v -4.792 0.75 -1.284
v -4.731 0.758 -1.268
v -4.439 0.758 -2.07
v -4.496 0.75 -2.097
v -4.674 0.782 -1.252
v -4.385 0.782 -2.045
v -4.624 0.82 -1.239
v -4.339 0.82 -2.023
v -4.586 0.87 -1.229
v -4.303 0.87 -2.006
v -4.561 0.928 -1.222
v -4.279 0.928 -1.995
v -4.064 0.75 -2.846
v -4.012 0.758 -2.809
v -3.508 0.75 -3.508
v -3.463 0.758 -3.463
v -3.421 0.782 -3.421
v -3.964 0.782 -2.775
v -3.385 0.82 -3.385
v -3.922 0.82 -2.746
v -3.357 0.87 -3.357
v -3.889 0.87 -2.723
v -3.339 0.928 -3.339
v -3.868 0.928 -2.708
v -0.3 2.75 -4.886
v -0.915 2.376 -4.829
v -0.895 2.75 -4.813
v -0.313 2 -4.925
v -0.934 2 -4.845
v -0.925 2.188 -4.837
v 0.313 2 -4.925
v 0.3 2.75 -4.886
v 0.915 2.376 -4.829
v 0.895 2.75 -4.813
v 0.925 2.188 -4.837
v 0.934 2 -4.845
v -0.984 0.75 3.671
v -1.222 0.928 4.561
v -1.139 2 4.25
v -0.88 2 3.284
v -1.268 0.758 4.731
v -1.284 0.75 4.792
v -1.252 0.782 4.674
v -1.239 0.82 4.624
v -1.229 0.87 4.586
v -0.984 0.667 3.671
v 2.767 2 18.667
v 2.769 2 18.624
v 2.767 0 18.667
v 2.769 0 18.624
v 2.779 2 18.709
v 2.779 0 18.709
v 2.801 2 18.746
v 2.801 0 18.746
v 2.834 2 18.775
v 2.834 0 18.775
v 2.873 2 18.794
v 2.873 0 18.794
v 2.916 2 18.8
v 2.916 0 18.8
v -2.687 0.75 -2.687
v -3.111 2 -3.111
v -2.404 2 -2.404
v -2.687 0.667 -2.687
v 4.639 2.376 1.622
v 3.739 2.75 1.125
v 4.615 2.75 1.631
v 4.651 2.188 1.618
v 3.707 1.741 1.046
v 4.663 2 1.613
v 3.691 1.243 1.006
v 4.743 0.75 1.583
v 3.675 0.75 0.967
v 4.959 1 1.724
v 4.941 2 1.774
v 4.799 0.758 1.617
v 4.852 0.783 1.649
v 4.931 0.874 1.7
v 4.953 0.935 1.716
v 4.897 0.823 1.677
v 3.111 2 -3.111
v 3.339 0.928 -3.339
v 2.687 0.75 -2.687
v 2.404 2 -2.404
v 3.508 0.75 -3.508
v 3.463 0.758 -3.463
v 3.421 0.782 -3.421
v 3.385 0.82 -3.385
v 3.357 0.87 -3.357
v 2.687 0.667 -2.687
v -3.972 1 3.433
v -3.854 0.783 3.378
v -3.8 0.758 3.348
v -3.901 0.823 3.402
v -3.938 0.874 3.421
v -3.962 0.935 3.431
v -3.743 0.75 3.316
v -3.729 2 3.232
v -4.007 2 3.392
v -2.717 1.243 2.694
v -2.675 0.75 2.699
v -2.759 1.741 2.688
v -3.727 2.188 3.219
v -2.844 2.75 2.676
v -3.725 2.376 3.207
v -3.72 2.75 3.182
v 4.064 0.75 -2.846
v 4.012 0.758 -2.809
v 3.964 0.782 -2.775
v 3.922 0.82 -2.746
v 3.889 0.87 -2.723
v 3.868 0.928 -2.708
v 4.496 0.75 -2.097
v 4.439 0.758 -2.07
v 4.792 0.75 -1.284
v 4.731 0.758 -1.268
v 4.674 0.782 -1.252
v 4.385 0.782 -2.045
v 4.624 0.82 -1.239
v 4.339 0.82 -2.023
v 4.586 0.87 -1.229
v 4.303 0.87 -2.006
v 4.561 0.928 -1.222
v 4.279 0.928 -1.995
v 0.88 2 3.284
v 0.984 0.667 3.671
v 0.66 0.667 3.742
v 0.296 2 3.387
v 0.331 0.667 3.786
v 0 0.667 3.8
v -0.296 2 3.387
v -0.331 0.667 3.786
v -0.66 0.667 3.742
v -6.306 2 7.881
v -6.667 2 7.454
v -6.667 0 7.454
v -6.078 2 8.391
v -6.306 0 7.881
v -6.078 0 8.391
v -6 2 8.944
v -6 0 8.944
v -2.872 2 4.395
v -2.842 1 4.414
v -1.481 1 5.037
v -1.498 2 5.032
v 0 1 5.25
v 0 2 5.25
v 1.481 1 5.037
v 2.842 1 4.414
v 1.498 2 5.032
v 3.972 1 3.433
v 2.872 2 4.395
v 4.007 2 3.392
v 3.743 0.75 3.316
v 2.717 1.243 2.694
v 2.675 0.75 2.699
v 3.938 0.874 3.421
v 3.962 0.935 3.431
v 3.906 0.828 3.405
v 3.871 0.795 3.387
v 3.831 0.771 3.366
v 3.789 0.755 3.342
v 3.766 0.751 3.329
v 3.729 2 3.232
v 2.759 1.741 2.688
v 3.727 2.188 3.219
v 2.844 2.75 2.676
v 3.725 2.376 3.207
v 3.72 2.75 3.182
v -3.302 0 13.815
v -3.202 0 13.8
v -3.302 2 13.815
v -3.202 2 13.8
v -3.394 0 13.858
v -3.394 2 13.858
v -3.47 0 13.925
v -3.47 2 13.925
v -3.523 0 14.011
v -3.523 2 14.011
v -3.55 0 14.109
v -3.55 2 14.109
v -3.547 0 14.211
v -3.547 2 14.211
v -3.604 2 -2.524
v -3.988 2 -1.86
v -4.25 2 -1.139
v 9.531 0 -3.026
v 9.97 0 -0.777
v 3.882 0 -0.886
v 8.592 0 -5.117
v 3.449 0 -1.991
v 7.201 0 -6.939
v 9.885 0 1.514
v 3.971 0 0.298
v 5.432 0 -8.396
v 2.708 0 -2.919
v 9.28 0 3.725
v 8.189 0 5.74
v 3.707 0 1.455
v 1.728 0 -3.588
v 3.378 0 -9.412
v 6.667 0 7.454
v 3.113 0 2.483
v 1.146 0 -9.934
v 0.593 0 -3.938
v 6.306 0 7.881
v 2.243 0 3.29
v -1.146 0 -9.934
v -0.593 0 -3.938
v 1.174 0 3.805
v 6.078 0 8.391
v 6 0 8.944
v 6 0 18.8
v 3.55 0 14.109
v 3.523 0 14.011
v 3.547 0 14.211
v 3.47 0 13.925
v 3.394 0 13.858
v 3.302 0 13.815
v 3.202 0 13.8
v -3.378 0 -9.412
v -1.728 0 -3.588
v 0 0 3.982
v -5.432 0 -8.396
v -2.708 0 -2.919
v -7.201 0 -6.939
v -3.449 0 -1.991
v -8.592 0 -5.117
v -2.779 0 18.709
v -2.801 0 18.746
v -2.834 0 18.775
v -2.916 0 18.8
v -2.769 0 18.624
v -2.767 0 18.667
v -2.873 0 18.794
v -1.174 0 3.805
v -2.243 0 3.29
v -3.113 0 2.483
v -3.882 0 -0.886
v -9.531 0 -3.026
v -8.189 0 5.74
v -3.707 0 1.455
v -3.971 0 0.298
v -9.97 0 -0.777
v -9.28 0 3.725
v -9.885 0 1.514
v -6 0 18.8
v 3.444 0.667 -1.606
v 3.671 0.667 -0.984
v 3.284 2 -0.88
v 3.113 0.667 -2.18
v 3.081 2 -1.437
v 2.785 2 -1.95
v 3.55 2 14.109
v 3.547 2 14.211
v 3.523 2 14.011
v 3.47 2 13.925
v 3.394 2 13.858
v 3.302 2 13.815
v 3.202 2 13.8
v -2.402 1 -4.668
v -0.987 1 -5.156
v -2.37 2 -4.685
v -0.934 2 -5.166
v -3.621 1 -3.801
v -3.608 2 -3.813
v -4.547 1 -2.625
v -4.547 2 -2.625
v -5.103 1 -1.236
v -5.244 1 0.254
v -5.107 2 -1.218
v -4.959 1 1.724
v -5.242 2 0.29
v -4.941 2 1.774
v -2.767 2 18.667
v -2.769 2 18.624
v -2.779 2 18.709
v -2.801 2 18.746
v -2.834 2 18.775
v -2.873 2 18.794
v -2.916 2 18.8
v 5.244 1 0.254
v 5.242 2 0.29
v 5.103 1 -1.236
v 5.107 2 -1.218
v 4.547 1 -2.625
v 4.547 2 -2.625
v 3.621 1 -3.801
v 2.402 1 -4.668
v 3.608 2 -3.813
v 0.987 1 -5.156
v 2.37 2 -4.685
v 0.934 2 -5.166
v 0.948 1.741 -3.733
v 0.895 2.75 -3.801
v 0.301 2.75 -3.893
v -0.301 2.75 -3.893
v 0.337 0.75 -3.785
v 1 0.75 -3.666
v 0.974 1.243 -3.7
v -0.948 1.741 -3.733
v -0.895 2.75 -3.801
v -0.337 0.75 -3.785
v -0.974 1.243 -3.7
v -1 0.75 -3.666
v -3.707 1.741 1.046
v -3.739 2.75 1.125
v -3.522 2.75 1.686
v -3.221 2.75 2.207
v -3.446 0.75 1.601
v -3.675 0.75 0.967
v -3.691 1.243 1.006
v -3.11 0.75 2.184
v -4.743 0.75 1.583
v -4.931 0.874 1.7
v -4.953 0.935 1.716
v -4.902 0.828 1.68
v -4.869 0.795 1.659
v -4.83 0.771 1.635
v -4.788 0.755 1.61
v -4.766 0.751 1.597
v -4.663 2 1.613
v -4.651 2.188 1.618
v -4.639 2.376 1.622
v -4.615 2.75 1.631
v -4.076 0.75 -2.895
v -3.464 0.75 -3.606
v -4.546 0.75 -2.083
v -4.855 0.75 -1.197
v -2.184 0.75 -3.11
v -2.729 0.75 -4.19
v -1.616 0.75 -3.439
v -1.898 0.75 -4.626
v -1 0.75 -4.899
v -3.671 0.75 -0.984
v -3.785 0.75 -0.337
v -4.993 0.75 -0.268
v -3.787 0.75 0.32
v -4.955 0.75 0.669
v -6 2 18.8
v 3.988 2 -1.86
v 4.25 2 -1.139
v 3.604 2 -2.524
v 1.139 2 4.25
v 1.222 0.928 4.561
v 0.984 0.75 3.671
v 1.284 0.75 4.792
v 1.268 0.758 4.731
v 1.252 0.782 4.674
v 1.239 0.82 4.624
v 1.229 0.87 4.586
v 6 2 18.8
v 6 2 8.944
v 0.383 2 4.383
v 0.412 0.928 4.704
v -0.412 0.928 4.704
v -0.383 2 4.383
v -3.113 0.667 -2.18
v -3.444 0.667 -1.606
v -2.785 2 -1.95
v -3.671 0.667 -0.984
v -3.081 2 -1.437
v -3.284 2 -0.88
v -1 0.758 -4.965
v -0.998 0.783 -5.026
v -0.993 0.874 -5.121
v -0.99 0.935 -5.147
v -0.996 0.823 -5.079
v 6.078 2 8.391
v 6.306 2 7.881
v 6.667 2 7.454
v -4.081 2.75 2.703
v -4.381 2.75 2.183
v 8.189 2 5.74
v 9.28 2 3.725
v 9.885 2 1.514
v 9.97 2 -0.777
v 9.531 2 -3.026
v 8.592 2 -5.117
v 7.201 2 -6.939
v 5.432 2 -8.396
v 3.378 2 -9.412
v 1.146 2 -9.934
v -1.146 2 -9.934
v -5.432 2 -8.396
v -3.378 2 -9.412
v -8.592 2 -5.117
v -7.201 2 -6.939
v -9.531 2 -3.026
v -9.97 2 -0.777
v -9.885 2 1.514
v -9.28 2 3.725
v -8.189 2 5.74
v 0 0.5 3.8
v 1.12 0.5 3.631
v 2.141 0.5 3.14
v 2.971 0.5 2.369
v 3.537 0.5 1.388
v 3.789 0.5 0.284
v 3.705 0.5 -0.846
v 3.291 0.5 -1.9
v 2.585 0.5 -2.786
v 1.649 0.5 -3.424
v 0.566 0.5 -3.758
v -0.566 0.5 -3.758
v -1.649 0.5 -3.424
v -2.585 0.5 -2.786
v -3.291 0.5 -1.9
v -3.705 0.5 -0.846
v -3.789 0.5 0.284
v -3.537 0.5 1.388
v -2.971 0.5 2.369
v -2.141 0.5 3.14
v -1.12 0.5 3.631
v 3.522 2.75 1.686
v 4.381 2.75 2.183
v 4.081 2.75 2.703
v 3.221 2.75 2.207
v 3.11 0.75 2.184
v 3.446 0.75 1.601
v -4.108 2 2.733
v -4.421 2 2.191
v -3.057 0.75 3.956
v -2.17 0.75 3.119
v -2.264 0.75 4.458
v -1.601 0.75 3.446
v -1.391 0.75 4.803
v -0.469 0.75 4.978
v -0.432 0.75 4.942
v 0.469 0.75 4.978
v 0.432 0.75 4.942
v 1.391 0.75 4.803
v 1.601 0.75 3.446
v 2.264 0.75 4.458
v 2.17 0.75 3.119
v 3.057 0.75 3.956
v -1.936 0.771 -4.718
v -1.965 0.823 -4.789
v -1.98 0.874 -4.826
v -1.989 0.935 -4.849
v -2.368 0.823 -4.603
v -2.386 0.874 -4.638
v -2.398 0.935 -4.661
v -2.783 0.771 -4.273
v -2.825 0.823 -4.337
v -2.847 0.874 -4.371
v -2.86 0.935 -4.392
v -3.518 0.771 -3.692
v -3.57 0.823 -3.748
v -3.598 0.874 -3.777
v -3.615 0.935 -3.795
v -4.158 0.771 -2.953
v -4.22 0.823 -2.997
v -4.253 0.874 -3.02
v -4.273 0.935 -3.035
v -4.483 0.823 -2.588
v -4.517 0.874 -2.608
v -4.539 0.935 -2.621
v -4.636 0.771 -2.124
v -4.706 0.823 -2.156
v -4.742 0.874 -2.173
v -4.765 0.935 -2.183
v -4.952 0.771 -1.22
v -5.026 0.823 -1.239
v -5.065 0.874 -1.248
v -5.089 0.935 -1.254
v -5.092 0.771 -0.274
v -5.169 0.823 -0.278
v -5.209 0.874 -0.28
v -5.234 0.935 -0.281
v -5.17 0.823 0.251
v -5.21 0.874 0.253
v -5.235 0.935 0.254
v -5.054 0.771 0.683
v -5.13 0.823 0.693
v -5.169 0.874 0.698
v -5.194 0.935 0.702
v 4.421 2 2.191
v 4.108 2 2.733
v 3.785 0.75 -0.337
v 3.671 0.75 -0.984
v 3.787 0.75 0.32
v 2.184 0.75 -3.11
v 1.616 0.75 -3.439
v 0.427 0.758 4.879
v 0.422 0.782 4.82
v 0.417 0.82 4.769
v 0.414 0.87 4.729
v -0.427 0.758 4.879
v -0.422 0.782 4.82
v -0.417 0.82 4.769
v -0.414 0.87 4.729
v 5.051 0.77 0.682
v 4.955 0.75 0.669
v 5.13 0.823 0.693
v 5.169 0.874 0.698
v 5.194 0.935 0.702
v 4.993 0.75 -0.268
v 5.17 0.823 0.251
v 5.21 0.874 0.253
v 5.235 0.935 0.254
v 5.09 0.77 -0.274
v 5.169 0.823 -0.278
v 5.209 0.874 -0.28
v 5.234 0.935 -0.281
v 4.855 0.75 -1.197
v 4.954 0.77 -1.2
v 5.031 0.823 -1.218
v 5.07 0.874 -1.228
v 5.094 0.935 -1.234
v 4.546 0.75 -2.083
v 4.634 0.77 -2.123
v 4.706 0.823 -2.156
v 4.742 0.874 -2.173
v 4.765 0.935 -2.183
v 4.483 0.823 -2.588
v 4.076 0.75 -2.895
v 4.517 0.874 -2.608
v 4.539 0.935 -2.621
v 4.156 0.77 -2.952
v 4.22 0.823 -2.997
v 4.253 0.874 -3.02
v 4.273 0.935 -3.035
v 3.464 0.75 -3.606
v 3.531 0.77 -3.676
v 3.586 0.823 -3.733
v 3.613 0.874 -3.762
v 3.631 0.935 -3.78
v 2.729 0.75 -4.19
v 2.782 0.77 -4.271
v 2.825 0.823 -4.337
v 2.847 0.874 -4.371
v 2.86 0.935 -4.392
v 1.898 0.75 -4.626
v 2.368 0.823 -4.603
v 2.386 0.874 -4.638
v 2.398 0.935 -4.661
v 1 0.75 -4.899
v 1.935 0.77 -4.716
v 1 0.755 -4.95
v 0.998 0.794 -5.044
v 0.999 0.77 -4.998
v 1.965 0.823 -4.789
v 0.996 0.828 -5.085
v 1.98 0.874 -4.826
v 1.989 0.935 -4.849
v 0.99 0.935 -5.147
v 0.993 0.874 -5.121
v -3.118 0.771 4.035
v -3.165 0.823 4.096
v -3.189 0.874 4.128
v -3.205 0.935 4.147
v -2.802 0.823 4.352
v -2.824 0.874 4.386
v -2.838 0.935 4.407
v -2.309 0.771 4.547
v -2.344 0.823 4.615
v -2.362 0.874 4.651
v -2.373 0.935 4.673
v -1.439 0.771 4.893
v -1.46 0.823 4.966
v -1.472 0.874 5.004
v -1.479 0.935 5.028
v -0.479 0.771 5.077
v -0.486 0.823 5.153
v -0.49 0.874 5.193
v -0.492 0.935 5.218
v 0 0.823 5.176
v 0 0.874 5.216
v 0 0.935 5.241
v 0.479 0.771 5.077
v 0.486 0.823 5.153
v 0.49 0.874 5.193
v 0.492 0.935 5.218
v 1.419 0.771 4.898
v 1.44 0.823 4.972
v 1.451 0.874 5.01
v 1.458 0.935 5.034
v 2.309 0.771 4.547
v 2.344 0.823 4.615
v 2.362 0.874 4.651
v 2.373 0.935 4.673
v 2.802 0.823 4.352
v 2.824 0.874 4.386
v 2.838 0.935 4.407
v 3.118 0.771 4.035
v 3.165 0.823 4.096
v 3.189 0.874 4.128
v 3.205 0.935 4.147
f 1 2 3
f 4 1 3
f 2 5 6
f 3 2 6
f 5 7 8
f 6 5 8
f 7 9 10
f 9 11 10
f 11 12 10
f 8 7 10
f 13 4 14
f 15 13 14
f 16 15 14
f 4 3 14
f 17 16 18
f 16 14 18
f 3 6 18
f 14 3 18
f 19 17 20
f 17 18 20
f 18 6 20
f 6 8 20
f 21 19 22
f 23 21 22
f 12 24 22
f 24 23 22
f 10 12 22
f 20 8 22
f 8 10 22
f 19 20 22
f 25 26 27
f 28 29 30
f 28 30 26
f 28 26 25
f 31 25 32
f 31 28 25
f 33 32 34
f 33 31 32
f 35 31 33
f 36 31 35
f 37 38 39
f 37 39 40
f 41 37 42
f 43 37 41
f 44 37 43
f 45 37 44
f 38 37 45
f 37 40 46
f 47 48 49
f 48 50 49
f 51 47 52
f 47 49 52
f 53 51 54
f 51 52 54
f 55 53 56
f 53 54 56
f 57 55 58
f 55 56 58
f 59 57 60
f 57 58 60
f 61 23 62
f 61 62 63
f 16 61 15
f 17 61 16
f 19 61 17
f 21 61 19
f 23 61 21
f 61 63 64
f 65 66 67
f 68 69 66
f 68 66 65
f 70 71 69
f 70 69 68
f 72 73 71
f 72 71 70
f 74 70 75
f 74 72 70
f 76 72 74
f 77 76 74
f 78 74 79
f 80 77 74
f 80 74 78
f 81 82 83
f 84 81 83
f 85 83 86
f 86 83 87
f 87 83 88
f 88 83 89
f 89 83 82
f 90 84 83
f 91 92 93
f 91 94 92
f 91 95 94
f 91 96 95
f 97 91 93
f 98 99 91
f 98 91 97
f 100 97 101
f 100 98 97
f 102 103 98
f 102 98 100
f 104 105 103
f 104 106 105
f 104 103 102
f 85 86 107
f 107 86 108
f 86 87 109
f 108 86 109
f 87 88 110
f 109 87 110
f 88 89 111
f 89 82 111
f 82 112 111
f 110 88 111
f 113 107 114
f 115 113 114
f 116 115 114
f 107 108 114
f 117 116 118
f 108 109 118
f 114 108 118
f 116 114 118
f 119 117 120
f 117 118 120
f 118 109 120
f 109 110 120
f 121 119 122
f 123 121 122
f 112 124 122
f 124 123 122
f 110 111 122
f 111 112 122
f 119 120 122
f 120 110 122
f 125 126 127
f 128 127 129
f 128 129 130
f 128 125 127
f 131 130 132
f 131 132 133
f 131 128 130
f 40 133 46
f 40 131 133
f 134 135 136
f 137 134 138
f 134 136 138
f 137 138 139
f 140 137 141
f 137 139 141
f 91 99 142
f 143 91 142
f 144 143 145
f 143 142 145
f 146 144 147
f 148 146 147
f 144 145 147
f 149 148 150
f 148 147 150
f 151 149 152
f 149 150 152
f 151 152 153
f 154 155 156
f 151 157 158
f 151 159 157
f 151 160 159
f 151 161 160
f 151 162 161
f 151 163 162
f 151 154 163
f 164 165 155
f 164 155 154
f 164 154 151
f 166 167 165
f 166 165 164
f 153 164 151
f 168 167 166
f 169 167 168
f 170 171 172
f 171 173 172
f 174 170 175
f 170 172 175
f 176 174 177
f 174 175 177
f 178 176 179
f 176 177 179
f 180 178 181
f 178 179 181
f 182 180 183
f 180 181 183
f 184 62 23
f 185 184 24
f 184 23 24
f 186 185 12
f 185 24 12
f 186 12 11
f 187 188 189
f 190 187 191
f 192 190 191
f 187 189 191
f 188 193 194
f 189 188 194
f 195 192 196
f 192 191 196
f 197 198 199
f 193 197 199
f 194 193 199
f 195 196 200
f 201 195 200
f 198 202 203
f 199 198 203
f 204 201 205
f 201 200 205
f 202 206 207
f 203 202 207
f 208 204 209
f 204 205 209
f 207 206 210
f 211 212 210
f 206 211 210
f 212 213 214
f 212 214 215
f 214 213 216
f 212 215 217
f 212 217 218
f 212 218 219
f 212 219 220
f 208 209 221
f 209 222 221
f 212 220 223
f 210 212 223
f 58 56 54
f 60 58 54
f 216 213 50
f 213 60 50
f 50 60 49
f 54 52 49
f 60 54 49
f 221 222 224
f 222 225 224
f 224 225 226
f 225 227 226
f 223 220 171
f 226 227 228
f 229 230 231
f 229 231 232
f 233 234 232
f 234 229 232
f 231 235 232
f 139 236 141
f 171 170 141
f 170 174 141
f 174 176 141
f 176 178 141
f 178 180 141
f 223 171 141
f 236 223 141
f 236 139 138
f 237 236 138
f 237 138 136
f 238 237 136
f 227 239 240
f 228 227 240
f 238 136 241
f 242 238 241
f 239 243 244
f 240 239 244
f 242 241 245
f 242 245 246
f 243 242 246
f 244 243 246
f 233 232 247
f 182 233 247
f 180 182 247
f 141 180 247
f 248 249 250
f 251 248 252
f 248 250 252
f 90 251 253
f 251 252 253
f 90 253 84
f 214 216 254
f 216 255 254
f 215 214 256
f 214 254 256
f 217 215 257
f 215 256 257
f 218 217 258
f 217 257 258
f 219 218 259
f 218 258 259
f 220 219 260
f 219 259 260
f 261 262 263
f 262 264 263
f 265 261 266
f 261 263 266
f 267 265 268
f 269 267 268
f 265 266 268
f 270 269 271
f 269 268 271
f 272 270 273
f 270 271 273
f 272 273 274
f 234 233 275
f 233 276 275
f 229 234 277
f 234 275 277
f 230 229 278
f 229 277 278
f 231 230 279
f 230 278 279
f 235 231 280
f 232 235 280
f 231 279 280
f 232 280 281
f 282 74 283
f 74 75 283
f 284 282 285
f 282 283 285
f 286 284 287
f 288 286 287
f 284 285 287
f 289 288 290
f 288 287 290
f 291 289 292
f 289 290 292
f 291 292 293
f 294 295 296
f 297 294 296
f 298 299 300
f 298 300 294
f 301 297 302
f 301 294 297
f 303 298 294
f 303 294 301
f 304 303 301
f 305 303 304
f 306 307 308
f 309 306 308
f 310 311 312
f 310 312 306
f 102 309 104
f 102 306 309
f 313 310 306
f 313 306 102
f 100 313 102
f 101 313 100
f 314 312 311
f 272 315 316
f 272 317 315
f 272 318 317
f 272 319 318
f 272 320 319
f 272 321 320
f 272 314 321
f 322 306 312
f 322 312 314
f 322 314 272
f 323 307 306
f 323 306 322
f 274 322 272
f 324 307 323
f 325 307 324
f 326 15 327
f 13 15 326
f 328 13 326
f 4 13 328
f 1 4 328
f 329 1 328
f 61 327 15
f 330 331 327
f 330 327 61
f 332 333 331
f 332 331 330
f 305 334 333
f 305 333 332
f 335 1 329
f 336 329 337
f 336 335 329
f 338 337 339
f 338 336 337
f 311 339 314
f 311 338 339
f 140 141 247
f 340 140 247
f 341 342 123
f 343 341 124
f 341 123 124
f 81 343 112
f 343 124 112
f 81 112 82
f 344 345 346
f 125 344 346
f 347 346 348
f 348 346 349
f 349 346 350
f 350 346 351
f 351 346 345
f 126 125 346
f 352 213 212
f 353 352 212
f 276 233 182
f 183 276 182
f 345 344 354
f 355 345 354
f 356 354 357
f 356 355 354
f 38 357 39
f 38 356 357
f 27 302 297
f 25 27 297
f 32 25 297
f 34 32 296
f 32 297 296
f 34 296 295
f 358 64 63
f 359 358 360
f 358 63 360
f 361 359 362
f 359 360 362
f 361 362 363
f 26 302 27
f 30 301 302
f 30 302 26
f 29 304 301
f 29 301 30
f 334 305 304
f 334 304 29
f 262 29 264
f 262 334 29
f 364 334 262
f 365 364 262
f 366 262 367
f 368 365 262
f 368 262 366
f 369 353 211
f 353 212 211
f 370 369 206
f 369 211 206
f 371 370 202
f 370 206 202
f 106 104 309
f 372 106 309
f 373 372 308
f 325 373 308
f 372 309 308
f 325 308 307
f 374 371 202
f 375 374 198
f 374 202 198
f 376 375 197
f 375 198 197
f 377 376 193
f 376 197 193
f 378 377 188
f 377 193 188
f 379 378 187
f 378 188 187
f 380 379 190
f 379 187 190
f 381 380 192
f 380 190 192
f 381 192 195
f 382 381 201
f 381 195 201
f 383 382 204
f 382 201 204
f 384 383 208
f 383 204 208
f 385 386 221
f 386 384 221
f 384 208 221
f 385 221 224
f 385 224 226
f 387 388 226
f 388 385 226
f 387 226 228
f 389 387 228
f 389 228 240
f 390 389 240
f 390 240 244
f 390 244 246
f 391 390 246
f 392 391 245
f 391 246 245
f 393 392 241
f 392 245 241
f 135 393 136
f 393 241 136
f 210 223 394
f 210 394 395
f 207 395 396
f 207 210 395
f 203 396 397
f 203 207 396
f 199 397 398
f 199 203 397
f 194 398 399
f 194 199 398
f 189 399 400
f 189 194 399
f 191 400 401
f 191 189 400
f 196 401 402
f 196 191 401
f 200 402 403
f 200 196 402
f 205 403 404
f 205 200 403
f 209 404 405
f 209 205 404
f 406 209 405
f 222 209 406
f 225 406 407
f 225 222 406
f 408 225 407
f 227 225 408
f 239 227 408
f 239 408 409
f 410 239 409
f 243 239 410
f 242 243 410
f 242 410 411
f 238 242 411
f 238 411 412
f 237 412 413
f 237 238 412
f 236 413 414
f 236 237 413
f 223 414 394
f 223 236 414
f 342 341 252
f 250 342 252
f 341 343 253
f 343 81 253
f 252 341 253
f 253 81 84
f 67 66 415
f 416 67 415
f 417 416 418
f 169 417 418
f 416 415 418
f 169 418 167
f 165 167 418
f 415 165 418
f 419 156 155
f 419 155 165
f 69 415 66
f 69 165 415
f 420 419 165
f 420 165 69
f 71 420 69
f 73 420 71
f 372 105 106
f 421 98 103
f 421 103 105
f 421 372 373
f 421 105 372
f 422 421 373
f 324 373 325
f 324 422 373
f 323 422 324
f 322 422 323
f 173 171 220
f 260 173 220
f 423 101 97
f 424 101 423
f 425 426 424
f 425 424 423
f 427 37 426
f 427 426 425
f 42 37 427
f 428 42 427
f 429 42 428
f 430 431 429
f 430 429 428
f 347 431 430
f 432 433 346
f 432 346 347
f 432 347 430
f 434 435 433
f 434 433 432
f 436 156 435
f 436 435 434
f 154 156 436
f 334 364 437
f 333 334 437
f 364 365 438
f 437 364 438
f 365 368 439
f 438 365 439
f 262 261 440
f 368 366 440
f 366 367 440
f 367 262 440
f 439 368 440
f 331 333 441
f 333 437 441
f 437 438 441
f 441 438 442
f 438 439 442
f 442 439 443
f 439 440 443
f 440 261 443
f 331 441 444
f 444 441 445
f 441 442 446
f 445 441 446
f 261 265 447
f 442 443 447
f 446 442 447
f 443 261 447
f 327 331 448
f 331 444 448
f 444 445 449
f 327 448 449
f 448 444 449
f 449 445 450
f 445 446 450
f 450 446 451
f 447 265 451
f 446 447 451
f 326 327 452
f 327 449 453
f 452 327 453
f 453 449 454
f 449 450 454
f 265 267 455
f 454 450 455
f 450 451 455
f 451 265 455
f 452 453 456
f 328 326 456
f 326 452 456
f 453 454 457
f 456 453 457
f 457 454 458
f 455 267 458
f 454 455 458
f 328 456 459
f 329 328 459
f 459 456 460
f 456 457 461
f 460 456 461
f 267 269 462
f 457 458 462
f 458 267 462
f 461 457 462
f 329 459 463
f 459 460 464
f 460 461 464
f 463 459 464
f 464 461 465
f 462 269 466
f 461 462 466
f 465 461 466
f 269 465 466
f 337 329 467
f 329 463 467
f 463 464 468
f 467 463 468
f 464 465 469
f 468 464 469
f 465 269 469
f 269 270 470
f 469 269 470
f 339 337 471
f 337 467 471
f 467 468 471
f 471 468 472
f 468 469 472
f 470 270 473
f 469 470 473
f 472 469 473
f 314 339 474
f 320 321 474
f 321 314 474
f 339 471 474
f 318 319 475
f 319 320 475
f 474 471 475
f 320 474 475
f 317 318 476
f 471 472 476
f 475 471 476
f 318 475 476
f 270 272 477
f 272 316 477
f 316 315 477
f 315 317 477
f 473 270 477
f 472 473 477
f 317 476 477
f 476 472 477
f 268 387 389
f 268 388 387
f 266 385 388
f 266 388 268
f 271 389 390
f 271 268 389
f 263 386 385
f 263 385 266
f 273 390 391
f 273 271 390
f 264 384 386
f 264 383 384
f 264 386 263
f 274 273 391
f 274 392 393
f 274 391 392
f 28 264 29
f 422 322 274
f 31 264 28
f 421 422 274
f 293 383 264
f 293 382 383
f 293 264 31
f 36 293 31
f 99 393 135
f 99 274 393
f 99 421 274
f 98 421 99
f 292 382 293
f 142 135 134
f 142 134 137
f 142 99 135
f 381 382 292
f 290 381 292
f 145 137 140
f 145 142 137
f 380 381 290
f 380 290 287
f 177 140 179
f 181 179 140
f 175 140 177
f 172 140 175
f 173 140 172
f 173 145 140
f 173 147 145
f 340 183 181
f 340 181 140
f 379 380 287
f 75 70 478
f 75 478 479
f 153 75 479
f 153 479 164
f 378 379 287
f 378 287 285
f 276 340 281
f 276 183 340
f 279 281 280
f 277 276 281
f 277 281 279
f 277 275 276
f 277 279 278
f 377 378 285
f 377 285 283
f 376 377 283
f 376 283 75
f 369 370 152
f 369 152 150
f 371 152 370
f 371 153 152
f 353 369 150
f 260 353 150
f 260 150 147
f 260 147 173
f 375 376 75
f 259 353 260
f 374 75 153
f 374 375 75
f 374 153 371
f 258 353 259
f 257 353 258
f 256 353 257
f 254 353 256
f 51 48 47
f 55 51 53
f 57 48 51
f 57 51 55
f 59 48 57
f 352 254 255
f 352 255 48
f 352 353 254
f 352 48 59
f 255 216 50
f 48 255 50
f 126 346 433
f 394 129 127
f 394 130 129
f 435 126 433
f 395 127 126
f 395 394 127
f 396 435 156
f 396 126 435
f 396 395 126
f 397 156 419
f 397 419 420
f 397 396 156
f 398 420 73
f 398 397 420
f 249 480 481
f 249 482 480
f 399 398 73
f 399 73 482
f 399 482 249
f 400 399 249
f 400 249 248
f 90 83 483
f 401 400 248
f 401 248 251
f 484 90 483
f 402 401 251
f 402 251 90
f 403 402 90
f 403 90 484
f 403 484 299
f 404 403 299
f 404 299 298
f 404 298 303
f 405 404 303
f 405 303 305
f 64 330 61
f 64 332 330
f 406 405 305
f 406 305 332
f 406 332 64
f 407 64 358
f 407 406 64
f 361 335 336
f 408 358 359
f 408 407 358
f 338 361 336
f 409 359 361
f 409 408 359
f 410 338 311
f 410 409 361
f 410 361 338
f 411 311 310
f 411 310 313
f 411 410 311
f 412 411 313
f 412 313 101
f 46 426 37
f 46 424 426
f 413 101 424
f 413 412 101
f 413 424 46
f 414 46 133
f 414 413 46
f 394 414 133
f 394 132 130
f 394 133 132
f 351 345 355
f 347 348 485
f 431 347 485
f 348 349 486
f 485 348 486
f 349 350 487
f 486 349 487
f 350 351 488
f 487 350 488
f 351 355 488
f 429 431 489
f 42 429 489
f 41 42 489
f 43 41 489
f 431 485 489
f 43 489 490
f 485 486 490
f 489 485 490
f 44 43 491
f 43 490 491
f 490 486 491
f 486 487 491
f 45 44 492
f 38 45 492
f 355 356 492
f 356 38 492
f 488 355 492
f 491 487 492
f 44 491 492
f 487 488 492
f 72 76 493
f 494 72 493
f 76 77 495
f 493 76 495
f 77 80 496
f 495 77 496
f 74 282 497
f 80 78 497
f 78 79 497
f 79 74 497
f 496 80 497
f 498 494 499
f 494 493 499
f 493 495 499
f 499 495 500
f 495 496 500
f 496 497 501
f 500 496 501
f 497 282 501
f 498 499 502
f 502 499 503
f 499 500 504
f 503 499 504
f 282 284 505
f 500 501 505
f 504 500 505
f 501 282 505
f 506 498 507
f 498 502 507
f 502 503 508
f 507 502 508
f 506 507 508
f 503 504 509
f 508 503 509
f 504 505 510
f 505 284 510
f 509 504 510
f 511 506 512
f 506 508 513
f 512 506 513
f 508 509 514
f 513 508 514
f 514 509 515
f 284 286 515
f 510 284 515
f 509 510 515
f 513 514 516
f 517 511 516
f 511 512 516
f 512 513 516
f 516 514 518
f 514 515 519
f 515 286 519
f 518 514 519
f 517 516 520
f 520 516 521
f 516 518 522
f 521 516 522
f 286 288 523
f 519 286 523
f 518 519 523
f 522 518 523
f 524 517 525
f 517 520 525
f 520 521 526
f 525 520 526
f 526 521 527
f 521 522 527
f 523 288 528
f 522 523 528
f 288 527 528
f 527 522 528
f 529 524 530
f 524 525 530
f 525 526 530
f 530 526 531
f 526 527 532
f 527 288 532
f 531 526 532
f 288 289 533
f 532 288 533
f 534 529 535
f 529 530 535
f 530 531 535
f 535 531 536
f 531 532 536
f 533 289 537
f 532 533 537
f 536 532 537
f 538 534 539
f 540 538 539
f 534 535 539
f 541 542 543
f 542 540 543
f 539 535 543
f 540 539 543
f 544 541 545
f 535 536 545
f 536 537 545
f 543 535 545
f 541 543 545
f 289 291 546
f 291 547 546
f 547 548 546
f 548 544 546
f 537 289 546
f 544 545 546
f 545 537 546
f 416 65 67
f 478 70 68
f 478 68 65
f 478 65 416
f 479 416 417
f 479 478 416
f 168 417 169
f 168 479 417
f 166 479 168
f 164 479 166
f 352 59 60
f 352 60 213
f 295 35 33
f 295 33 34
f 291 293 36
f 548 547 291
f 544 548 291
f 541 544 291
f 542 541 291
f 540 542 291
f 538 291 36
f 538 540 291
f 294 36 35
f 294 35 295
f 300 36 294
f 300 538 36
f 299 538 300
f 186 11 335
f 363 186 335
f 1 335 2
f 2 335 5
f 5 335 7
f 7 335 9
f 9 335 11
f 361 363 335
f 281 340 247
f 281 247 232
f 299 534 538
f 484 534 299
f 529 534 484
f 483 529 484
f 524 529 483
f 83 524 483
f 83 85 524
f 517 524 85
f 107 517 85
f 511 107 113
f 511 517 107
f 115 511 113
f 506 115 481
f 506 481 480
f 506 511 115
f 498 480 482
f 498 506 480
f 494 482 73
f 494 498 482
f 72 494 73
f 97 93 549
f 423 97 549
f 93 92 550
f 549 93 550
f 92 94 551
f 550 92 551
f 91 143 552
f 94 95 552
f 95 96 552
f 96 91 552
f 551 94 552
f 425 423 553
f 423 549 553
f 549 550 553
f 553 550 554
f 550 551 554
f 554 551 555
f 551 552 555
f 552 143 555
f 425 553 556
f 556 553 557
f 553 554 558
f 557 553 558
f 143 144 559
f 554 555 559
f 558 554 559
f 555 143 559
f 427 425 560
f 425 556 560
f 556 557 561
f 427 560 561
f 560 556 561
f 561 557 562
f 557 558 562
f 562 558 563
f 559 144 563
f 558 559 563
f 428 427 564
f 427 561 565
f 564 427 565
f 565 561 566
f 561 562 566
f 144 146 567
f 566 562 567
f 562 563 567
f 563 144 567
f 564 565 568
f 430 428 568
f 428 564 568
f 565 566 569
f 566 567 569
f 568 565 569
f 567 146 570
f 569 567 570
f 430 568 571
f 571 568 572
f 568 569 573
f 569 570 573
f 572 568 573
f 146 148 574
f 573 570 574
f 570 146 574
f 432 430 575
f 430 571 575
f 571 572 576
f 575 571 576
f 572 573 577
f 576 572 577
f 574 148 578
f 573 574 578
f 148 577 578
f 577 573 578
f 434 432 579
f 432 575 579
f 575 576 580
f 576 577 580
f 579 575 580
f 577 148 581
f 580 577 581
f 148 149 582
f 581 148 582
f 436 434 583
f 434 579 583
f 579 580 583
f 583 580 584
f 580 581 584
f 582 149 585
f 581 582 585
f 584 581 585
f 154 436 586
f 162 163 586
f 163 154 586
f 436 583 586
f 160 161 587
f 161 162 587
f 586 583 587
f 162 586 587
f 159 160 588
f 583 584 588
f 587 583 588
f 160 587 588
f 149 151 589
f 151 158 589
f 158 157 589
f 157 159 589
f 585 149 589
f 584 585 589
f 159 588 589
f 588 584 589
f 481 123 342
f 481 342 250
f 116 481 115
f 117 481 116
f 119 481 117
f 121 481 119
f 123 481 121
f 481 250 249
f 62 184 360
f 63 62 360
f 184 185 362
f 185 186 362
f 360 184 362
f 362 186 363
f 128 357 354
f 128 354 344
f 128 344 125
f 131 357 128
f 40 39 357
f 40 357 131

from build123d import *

# Parameters (mm, degrees)
SKETCH1_R                = 4
BOSS_EXTRUDE1_DEPTH      = 2
SKETCH2_R                = 10
SKETCH2_R_2              = 3.8
BOSS_EXTRUDE2_DEPTH      = 2
SKETCH4_W                = 12
SKETCH4_H                = 0.2
CUT_EXTRUDE1_DEPTH       = 4
FILLET3_R                = 0.35
FILLET4_R                = 0.15
FILLET6_R                = 2
SKETCH13_R               = 5.25
CUT_EXTRUDE5_DEPTH       = 1.25
REVOLVE2_ANGLE           = 30
CIRPATTERN2_COUNT        = 3
CHAMFER1_SIZE            = 0.5
CHAMFER1_SIZE2           = 0.181985117
FILLET14_R               = 0.25
BOSS_EXTRUDE8_START      = -0.75
BOSS_EXTRUDE8_DEPTH      = 2
BOSS_EXTRUDE8_DRAFT      = -3
SKETCH16_W               = 2
SKETCH16_H               = 1.934959958
BOSS_EXTRUDE9_DEPTH      = 1.25
BOSS_EXTRUDE9_TAPER      = 3
CIRPATTERN3_COUNT        = 3
CIRPATTERN3_START        = -0.75
CIRPATTERN3_COPY_1_DEPTH = 2
CIRPATTERN3_COPY_1_DRAFT = -3
CIRPATTERN3_COPY_2_DEPTH = 2
CIRPATTERN3_COPY_2_DRAFT = -3


with BuildPart() as part:
    # Sketch1 → Boss-Extrude1 (new body)
    with BuildSketch(Plane(origin=(0, 0, 0), x_dir=(1, 0, 0), z_dir=(0, 1, 0))):
        Polygon((-6, 6), (-6, -13.291502622), (-6, -19), (-2.70227506, -19), (-3.619175359, -13.8), (0, -13.8), (3.619175359, -13.8), (2.70227506, -19), (6, -19), (6, -13.291502622), (6, 6), align=None)
        with Locations(Location((0, 0, 0), (0, 0, 270))):
            Circle(SKETCH1_R, mode=Mode.SUBTRACT)
    extrude(amount=BOSS_EXTRUDE1_DEPTH)

    # Sketch2 → Boss-Extrude2 (add)
    with BuildSketch(Plane(origin=(0, 0, 0), x_dir=(1, 0, 0), z_dir=(0, 1, 0))):
        Circle(SKETCH2_R)
        with Locations(Location((0, 0, 0), (0, 0, 270))):
            Circle(SKETCH2_R_2, mode=Mode.SUBTRACT)
    extrude(amount=BOSS_EXTRUDE2_DEPTH)

    # Sketch4 → Cut-Extrude1 (cut)
    with BuildSketch(Plane(origin=(0, 2, 0), x_dir=(1, 0, 0), z_dir=(0, 1, 0))):
        with Locations((0, -18.9)):
            Rectangle(SKETCH4_W, SKETCH4_H)
    extrude(amount=-CUT_EXTRUDE1_DEPTH, mode=Mode.SUBTRACT)

    # Fillet3
    fillet3_edges = [part.edges().sort_by_distance(p)[0] for p in [
        (3.619175359, 1, 13.8),
        (-3.619175359, 1, 13.8),
    ]]
    fillet(fillet3_edges, radius=FILLET3_R)

    # Fillet4
    fillet4_edges = [part.edges().sort_by_distance(p)[0] for p in [
        (2.737540456, 1, 18.8),
        (-2.737540456, 1, 18.8),
    ]]
    fillet(fillet4_edges, radius=FILLET4_R)

    # Fillet6
    fillet6_edges = [part.edges().sort_by_distance(p)[0] for p in [
        (6, 1, 8),
        (-6, 1, 8),
    ]]
    fillet(fillet6_edges, radius=FILLET6_R)

    # Sketch13 → Cut-Extrude5 (cut)
    with BuildSketch(Plane(origin=(0, 2, 0), x_dir=(1, 0, 0), z_dir=(0, 1, 0))):
        with Locations(Location((0, 0, 0), (0, 0, 270))):
            Circle(SKETCH13_R)
    extrude(amount=-CUT_EXTRUDE5_DEPTH, mode=Mode.SUBTRACT)

    # Sketch12 → Revolve2 (revolve, symmetric)
    with BuildSketch(Plane(origin=(0, 0, 0), x_dir=(0, 0, -1), z_dir=(1, 0, 0))) as revolve2_sk:
        Polygon((-4, 0), (-3.4, 2), (-4.4, 2), (-5, 0), align=None)
    revolve2 = revolve(axis=Axis((0, 0, 0), (0, 1, 0)), revolution_arc=REVOLVE2_ANGLE / 2)
    revolve2 = revolve2 + revolve(revolve2_sk.sketch, axis=Axis((0, 0, 0), (0, -1, 0)), revolution_arc=REVOLVE2_ANGLE / 2)

    # CirPattern2: Revolve2 ×3 about axis
    cirpattern2_axis = Axis((0, 0, 0), (0, 1, 0))
    for i in range(1, CIRPATTERN2_COUNT):
        add(revolve2.rotate(cirpattern2_axis, i * 360 / CIRPATTERN2_COUNT))

    # Chamfer1
    chamfer1_edges = [part.edges().sort_by_distance(p)[0] for p in [
        (0, 0, -3.8),
    ]]
    chamfer1_side = [part.faces().sort_by_distance(p)[0] for p in [
        (0, 0.375, -3.8),
    ]]
    chamfer(chamfer1_edges, length=CHAMFER1_SIZE, length2=CHAMFER1_SIZE2, reference=chamfer1_side[0])

    # Fillet14
    fillet14_edges = [part.edges().sort_by_distance(p)[0] for p in [
        (0, 0.75, -5.25),
        (0, 0.75, 4.775),
        (-4.135271303, 0.75, -2.3875),
        (4.135271303, 0.75, -2.3875),
    ]]
    fillet(fillet14_edges, radius=FILLET14_R)


with BuildPart() as boss_extrude8_tool:
    # Sketch15 → Boss-Extrude8 (with draft: the straight prism first)
    with BuildSketch(Plane.XZ.offset(BOSS_EXTRUDE8_START)):
        with BuildLine():
            Line((1, -4.898979486), (1, -3.666060556))
            ThreePointArc((1, -3.666060556), (0, -3.8), (-1, -3.666060556))
            Line((-1, -3.666060556), (-1, -4.898979486))
            ThreePointArc((-1, -4.898979486), (0, -5), (1, -4.898979486))
        make_face()
    extrude(amount=-BOSS_EXTRUDE8_DEPTH)
    # Boss-Extrude8: the draft: its side faces are tilted about the plane it starts from
    boss_extrude8_sides = [boss_extrude8_tool.faces().sort_by_distance(p)[0] for p in [
        (1, 1.75, -4.282520021),
        (0, 1.75, -3.8),
        (-1, 1.75, -4.282520021),
        (0, 1.75, -5),
    ]]
    draft(boss_extrude8_sides, Plane.XZ.offset(BOSS_EXTRUDE8_START), BOSS_EXTRUDE8_DRAFT)


with BuildPart() as part_1:
    add(part.part)

    # Boss-Extrude8: add boss_extrude8_tool
    add(boss_extrude8_tool.part)

    # Sketch16 → Boss-Extrude9 (add)
    with BuildSketch(Plane(origin=(0, 0.75, 0), x_dir=(1, 0, 0), z_dir=(0, 1, 0))):
        with Locations((0, 5.25)):
            Rectangle(SKETCH16_W, SKETCH16_H)
    boss_extrude9 = extrude(amount=BOSS_EXTRUDE9_DEPTH, taper=BOSS_EXTRUDE9_TAPER)

    # CirPattern3: Boss-Extrude9 ×3 about axis
    cirpattern3_axis = Axis((0, 0, 0), (0, 1, 0))
    for i in range(1, CIRPATTERN3_COUNT):
        add(boss_extrude9.rotate(cirpattern3_axis, i * 360 / CIRPATTERN3_COUNT))


with BuildPart() as cirpattern3_copy_1_tool:
    # CirPattern3 copy 1 sketch → CirPattern3 copy 1 (with draft: the straight prism first)
    with BuildSketch(Plane(origin=(0, 0, 0), x_dir=(-0.4999999999999998, 0, -0.8660254037844387), z_dir=(0, -1, 0)).offset(CIRPATTERN3_START)):
        with BuildLine():
            Line((1, -4.898979486), (1, -3.666060556))
            ThreePointArc((1, -3.666060556), (0, -3.8), (-1, -3.666060556))
            Line((-1, -3.666060556), (-1, -4.898979486))
            ThreePointArc((-1, -4.898979486), (0, -5), (1, -4.898979486))
        make_face()
    extrude(amount=-CIRPATTERN3_COPY_1_DEPTH)
    # CirPattern3 copy 1: the draft: its side faces are tilted about the plane it starts from
    cirpattern3_copy_1_sides = [cirpattern3_copy_1_tool.faces().sort_by_distance(p)[0] for p in [
        (-4.20877113, 1.75, 1.275234607),
        (-3.290896534, 1.75, 1.9),
        (-3.20877113, 1.75, 3.007285414),
        (-4.330127019, 1.75, 2.5),
    ]]
    draft(cirpattern3_copy_1_sides, Plane(origin=(0, 0, 0), x_dir=(-0.4999999999999998, 0, -0.8660254037844387), z_dir=(0, -1, 0)).offset(CIRPATTERN3_START), CIRPATTERN3_COPY_1_DRAFT)


with BuildPart() as part_2:
    add(part_1.part)

    # CirPattern3 copy 1: add cirpattern3_copy_1_tool
    add(cirpattern3_copy_1_tool.part)


with BuildPart() as cirpattern3_copy_2_tool:
    # CirPattern3 copy 2 sketch → CirPattern3 copy 2 (with draft: the straight prism first)
    with BuildSketch(Plane(origin=(0, 0, 0), x_dir=(-0.5000000000000004, 0, 0.8660254037844384), z_dir=(0, -1, 0)).offset(CIRPATTERN3_START)):
        with BuildLine():
            Line((1, -4.898979486), (1, -3.666060556))
            ThreePointArc((1, -3.666060556), (0, -3.8), (-1, -3.666060556))
            Line((-1, -3.666060556), (-1, -4.898979486))
            ThreePointArc((-1, -4.898979486), (0, -5), (1, -4.898979486))
        make_face()
    extrude(amount=-CIRPATTERN3_COPY_2_DEPTH)
    # CirPattern3 copy 2: the draft: its side faces are tilted about the plane it starts from
    cirpattern3_copy_2_sides = [cirpattern3_copy_2_tool.faces().sort_by_distance(p)[0] for p in [
        (3.20877113, 1.75, 3.007285414),
        (3.290896534, 1.75, 1.9),
        (4.20877113, 1.75, 1.275234607),
        (4.330127019, 1.75, 2.5),
    ]]
    draft(cirpattern3_copy_2_sides, Plane(origin=(0, 0, 0), x_dir=(-0.5000000000000004, 0, 0.8660254037844384), z_dir=(0, -1, 0)).offset(CIRPATTERN3_START), CIRPATTERN3_COPY_2_DRAFT)


with BuildPart() as part_3:
    add(part_2.part)

    # CirPattern3 copy 2: add cirpattern3_copy_2_tool
    add(cirpattern3_copy_2_tool.part)


solid = part_3.part
